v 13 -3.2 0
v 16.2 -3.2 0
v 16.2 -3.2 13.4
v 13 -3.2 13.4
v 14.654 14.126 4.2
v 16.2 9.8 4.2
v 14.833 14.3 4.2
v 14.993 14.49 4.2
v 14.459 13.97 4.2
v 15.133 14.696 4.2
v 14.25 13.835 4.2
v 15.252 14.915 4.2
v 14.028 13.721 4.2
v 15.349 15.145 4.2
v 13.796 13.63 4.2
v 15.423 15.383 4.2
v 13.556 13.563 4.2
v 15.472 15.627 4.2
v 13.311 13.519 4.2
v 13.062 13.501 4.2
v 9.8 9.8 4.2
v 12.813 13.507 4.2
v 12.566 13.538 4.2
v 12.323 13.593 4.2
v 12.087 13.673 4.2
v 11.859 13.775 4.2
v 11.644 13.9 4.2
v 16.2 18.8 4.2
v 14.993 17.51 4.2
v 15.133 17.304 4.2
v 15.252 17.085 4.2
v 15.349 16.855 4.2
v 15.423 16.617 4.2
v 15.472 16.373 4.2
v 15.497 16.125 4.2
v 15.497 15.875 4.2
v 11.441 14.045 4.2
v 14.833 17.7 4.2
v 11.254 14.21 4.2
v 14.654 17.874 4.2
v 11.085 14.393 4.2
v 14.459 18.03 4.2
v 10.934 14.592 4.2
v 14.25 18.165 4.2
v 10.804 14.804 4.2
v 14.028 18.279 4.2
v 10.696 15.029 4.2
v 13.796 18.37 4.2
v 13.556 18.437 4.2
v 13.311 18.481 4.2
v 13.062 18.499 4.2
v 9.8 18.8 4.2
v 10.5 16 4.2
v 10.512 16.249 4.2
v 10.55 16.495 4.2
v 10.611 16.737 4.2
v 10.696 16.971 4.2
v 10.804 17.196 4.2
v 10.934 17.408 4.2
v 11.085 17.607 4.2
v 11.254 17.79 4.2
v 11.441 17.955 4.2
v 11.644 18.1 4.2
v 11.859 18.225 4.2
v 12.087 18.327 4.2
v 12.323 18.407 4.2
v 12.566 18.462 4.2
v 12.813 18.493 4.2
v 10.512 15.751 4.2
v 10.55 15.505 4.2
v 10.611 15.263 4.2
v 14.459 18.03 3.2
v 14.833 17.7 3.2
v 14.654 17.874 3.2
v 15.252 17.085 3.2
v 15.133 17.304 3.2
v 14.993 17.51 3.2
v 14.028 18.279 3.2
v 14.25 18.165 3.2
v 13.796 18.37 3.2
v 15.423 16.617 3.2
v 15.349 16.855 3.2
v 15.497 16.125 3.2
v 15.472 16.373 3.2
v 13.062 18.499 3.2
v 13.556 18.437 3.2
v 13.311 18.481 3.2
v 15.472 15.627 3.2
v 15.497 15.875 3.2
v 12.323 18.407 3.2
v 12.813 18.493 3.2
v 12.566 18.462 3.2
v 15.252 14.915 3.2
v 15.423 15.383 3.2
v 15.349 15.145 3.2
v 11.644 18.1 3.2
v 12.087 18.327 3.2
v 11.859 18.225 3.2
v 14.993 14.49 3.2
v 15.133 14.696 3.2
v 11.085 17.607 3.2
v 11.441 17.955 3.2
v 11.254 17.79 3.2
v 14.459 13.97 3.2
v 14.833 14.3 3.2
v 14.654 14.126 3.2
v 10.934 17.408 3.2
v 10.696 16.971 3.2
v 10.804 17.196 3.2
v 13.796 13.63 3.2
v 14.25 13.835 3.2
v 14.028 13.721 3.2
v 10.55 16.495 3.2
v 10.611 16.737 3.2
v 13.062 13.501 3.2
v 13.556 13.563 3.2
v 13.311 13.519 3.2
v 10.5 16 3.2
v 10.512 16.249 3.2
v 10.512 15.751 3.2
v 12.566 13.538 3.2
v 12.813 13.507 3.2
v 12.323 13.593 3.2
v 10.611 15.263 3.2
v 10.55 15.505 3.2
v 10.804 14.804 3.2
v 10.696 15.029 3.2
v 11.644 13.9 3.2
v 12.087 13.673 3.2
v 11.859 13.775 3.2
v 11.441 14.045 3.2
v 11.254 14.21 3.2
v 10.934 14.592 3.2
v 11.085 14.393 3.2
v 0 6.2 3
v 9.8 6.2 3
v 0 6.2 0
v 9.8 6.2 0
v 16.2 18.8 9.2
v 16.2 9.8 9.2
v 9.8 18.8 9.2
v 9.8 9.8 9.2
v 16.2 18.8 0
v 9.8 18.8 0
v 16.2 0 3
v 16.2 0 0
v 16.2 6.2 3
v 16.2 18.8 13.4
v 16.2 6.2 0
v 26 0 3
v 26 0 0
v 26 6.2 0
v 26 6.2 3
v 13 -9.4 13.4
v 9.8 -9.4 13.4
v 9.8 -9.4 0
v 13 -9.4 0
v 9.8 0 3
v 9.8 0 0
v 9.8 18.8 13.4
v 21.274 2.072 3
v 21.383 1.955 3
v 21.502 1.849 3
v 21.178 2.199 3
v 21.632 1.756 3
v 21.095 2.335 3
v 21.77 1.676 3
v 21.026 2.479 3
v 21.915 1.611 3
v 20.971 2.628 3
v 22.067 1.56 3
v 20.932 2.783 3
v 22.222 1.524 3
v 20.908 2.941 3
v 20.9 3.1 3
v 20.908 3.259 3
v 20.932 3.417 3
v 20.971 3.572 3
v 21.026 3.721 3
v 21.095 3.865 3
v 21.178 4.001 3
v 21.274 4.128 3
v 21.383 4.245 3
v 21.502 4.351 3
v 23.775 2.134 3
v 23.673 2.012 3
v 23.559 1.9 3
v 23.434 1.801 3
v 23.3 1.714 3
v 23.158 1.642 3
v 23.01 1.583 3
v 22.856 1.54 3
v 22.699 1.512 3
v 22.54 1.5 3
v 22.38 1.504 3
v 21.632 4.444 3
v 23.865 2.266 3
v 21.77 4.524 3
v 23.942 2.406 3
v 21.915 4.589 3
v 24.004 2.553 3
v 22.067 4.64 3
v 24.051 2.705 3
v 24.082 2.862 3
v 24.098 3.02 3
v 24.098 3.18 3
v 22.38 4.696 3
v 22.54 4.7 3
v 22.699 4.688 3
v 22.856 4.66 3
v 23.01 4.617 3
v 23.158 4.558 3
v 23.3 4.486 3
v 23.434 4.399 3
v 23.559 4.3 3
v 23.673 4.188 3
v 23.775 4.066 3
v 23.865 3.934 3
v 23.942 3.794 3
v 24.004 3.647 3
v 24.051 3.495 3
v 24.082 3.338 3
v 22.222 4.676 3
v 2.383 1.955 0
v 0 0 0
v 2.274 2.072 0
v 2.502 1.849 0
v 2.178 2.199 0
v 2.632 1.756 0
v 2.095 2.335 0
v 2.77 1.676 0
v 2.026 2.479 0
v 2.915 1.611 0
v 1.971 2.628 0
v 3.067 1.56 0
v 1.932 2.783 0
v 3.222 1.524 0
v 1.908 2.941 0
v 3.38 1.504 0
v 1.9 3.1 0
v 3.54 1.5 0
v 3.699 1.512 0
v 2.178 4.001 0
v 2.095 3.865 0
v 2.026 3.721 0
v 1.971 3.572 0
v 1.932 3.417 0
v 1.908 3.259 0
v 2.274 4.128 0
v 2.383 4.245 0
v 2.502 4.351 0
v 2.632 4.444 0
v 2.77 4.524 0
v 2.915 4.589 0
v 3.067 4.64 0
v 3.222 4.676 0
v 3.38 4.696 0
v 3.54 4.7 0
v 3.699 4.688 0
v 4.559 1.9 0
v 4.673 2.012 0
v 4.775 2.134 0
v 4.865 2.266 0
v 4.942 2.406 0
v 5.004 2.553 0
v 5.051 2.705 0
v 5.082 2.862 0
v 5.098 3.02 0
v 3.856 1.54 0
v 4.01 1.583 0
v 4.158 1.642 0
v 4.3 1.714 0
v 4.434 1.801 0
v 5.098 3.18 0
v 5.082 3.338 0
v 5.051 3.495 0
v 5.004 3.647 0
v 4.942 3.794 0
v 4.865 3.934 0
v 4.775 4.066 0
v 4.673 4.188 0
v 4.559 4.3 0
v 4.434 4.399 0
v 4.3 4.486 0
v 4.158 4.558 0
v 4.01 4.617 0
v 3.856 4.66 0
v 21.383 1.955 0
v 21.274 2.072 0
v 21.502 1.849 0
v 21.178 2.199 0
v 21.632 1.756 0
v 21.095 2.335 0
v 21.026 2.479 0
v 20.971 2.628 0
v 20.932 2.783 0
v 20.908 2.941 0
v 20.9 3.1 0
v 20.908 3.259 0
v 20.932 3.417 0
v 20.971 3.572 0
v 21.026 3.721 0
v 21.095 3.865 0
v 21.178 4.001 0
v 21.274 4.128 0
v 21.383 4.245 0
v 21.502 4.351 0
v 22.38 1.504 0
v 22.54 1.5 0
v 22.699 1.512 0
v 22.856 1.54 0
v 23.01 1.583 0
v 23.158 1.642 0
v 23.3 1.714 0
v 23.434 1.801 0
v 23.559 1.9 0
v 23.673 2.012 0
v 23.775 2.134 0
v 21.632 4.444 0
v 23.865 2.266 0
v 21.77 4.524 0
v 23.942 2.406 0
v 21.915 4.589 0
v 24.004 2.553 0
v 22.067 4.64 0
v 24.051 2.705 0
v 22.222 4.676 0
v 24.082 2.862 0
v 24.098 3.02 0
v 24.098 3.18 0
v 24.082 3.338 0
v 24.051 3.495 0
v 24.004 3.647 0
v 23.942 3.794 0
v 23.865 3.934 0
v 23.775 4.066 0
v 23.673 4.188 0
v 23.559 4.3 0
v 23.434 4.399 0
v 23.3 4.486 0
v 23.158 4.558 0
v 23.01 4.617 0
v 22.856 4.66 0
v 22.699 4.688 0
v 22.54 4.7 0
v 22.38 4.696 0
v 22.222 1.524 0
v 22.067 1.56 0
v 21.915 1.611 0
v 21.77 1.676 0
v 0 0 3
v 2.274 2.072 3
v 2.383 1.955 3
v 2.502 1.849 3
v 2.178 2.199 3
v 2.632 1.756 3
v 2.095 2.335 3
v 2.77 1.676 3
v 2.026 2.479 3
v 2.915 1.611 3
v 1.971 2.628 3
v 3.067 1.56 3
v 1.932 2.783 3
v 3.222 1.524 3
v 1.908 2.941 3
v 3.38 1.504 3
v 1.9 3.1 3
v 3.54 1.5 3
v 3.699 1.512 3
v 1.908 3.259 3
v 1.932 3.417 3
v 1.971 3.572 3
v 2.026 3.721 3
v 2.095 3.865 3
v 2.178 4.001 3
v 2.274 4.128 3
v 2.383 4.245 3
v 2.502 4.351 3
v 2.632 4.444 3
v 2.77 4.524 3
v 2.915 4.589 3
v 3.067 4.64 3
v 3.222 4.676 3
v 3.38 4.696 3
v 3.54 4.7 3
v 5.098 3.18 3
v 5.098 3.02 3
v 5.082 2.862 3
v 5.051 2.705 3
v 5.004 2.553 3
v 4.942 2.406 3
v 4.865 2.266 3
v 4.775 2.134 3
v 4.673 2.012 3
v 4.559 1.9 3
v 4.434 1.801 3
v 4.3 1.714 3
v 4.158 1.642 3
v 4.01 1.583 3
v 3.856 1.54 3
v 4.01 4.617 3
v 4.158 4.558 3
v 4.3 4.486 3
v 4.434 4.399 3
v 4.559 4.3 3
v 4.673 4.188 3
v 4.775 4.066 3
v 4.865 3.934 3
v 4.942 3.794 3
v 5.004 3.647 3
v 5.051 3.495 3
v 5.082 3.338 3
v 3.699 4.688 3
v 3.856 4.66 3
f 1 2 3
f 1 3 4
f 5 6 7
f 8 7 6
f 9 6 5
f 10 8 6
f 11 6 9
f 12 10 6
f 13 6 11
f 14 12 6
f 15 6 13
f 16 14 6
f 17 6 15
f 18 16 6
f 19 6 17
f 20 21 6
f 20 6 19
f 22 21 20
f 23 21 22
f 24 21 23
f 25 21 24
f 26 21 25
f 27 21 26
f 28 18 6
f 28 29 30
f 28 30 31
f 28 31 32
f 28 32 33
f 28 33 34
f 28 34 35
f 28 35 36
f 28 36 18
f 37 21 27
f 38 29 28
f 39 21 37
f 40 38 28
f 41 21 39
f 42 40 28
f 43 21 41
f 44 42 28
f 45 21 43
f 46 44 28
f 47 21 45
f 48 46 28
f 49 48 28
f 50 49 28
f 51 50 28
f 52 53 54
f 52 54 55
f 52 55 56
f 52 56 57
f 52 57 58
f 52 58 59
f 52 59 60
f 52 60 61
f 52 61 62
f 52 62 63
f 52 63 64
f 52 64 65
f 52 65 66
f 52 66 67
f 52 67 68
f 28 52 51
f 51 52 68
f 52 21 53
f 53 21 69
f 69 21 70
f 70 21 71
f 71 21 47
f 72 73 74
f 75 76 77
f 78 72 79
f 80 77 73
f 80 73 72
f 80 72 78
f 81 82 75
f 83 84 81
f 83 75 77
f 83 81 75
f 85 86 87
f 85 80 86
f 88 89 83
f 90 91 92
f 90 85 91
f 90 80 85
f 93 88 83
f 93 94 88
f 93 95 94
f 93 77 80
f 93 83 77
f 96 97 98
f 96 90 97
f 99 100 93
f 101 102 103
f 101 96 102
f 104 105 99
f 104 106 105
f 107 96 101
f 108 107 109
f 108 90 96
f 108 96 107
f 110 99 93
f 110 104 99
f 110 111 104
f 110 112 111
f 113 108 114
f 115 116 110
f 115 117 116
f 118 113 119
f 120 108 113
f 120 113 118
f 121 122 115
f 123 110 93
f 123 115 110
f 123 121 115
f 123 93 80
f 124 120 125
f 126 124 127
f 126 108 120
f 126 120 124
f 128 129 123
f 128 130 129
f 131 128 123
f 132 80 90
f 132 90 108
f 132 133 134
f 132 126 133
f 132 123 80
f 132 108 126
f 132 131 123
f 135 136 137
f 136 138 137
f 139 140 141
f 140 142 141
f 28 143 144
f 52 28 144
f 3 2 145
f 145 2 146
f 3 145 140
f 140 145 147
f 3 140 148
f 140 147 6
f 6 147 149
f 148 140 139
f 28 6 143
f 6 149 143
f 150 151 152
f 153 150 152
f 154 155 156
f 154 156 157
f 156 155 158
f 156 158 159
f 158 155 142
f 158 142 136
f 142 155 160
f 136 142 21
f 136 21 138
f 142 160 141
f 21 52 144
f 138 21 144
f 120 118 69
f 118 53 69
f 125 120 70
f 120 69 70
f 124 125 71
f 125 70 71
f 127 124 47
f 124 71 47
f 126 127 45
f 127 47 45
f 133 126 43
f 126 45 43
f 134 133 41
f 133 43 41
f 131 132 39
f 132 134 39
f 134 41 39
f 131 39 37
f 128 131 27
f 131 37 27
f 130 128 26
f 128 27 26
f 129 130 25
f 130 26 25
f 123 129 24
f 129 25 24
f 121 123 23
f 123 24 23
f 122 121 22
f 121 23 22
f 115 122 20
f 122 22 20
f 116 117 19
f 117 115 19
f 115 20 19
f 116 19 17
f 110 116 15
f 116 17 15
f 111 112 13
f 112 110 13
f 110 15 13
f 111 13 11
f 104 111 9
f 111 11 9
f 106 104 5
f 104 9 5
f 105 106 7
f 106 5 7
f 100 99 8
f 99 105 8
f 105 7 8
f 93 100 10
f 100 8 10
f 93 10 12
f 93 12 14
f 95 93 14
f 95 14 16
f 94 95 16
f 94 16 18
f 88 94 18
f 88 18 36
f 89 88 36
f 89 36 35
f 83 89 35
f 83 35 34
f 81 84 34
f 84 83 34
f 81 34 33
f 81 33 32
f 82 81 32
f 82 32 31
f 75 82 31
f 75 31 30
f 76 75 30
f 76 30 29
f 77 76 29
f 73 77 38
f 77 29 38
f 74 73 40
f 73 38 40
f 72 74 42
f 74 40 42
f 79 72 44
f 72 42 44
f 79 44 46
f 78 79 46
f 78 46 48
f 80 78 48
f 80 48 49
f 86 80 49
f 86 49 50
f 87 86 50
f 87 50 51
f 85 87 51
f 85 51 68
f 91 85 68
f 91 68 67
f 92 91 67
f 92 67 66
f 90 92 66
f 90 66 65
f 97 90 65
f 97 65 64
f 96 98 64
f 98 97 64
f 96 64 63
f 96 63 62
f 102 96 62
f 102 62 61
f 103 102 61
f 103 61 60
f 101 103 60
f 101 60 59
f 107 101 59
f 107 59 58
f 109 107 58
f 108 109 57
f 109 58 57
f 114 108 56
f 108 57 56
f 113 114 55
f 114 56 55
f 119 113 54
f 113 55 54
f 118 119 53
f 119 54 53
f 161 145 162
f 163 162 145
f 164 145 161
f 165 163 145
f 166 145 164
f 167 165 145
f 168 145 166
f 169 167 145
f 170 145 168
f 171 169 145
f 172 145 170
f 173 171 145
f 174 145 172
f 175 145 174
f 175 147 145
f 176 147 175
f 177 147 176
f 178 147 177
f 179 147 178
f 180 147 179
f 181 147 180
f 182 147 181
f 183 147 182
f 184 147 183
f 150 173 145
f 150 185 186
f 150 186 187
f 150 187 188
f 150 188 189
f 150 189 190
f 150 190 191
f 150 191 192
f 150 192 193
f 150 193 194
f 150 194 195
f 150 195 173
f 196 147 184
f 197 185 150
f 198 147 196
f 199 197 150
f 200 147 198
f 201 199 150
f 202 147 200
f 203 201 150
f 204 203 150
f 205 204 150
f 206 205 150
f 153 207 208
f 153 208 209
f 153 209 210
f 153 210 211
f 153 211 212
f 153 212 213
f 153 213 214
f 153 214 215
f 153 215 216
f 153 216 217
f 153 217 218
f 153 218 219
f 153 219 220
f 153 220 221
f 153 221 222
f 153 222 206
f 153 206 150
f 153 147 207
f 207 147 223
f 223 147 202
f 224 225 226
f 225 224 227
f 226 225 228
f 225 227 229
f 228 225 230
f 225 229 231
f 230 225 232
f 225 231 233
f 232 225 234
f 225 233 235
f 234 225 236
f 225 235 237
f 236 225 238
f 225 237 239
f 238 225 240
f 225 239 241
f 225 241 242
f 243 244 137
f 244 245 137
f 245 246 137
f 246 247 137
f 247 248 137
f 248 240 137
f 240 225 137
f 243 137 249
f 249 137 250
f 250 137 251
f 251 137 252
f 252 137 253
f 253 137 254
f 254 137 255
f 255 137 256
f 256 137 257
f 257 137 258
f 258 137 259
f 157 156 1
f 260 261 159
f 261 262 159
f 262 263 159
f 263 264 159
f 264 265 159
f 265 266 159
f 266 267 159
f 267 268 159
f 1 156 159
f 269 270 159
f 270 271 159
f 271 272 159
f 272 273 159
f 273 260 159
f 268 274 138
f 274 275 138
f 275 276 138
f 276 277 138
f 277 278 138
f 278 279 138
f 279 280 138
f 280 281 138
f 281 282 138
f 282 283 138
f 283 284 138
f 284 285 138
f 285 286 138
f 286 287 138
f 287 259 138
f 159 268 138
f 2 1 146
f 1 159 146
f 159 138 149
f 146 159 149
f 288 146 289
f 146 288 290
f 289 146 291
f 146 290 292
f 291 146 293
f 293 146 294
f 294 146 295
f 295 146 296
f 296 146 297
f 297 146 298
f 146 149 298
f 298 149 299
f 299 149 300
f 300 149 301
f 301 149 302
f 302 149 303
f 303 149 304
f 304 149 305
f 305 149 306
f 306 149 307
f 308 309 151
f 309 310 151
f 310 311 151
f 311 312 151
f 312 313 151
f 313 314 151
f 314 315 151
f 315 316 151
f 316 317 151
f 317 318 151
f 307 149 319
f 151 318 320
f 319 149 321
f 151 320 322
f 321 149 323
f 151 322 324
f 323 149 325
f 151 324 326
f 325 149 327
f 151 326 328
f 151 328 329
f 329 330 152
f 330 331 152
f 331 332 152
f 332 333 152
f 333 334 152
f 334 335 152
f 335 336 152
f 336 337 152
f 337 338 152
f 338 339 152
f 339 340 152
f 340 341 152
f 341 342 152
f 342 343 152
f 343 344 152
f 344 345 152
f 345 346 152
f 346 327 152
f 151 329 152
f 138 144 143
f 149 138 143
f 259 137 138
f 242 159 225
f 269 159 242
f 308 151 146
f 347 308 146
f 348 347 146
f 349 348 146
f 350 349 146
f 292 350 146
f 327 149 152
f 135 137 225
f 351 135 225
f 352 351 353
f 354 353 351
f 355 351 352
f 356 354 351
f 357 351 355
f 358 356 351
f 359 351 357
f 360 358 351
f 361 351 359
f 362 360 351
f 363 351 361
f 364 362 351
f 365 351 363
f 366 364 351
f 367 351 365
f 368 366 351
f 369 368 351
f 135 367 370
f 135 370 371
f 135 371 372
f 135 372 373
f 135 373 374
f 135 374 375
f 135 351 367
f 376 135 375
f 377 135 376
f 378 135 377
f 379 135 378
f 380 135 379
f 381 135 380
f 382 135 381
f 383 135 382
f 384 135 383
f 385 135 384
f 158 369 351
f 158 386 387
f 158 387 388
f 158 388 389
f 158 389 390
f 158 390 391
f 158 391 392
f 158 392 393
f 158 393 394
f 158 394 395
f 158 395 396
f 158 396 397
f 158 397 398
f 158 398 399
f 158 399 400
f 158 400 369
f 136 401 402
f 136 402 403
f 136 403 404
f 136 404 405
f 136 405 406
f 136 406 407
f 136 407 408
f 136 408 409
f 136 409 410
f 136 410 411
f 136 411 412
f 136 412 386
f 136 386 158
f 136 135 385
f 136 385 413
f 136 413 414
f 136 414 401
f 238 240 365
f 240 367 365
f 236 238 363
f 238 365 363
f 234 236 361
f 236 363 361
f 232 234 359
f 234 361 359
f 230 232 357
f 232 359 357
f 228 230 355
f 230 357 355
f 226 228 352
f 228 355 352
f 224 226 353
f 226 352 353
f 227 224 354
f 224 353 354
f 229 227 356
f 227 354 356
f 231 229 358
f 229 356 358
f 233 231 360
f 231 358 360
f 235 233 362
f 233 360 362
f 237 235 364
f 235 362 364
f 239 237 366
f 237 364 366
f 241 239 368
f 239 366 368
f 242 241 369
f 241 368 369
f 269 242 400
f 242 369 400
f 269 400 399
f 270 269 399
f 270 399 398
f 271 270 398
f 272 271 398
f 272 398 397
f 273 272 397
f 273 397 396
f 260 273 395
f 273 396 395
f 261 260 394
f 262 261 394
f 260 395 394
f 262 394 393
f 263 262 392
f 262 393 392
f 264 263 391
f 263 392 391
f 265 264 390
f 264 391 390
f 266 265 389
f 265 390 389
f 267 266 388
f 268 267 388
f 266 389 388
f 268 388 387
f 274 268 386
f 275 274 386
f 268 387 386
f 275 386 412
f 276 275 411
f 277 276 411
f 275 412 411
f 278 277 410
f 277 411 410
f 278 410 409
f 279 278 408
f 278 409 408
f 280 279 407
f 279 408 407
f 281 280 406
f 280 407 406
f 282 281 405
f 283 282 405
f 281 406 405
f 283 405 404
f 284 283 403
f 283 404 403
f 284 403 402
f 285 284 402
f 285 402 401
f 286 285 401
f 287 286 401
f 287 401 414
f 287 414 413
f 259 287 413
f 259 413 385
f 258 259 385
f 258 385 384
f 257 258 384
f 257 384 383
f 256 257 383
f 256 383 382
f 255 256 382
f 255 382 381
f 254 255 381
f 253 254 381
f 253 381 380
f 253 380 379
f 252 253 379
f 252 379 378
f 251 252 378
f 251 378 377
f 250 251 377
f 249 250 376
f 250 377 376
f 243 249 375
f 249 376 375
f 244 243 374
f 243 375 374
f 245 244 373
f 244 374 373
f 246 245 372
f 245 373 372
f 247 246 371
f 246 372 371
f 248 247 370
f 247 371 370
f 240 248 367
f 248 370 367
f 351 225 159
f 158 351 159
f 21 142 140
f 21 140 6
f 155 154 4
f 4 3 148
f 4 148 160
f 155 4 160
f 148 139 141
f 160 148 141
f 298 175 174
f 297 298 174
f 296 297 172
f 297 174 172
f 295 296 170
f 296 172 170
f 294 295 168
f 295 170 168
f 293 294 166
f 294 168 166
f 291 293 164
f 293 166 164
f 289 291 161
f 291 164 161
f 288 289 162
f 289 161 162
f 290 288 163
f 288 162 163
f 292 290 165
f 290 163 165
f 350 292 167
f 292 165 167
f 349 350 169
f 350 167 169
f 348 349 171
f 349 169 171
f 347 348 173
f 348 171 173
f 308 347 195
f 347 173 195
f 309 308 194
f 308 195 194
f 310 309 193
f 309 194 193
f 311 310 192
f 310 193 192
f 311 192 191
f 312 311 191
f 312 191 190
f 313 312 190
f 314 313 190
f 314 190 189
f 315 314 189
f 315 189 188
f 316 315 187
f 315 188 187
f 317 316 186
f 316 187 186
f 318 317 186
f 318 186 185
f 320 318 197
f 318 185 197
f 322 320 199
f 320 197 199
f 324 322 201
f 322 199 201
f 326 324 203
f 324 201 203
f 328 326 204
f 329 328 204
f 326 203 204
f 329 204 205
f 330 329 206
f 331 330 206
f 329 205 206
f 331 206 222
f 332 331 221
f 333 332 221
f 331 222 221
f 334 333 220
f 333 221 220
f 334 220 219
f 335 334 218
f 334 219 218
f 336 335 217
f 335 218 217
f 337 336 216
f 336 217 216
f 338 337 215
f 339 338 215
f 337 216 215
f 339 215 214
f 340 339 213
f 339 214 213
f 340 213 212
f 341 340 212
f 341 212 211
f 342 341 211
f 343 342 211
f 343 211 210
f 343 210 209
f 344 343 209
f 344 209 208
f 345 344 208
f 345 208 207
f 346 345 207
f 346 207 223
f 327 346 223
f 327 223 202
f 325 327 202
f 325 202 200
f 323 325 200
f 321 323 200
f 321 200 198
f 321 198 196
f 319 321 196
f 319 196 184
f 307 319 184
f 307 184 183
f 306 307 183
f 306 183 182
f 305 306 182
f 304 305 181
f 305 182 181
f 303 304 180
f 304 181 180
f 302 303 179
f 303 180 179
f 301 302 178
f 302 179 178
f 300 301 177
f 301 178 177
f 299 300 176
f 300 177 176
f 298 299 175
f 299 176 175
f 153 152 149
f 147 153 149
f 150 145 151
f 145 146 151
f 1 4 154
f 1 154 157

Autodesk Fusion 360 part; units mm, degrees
sketch "Sketch1" plane through (0, 0, 0) normal (0, 0, 1) x (1, 0, 0)
  line L0 (0, 0) -> (26, 0)
  line L1 (26, 0) -> (26, 6.2)
  line L2 (26, 6.2) -> (0, 6.2)
  line L3 (0, 6.2) -> (0, 0)
  dimension "d1" = 26
  dimension "d2" = 6.2
extrude "Extrude1" add sketch "Sketch1" along normal blind 3
sketch "Sketch2" plane through (0, 0, 0) normal (0, 0, 1) x (1, 0, 0)
  line L0 (0, 0) -> (13, 0)
  line L1 (13, 0) -> (13, -3.2)
  line L2 (13, -3.2) -> (9.8, -3.2)
  line L3 (9.8, -3.2) -> (9.8, 0)
  line L4 (9.8, 0) -> (13, 0)
  line L5 (13, 0) -> (13, -3.2)
  line L6 (13, -3.2) -> (16.2, -3.2)
  line L7 (16.2, -3.2) -> (16.2, 0)
  line L8 (16.2, 0) -> (13, 0)
  line L9 (13, 0) -> (13, -3.2)
  line L10 (9.8, -3.2) -> (16.2, -3.2)
  line L11 (16.2, -3.2) -> (16.2, 18.8)
  line L12 (16.2, 18.8) -> (9.8, 18.8)
  line L13 (9.8, 18.8) -> (9.8, -3.2)
  dimension "d5" = 13
  dimension "d6" = 3.2
  dimension "d7" = 3.2
  dimension "d8" = 3.2
  dimension "d9" = 6.4
  dimension "d10" = 22
extrude "Extrude2" add sketch "Sketch2" along normal blind 13.4
sketch "Sketch3" plane through (0, -3.2, 0) normal (0, -1, 0) x (1, 0, 0)
  line L0 (9.8, 0) -> (16.2, 0)
  line L1 (16.2, 0) -> (16.2, 13.4)
  line L2 (16.2, 13.4) -> (9.8, 13.4)
  line L3 (9.8, 13.4) -> (9.8, 0)
  line L4 (9.8, 13.4) -> (13, 13.4)
  line L5 (13, 13.4) -> (13, 0)
  line L6 (13, 0) -> (9.8, 0)
  line L7 (9.8, 0) -> (9.8, 13.4)
extrude "Extrude3" add sketch "Sketch3" along normal blind 6.2 contours L0 L2 L3 L4 L5 L6 L7
sketch "Sketch4" plane through (0, 0, 3) normal (0, 0, 1) x (-1, 0, 0)
  line L0 (-9.8, 0) -> (-9.8, -6.2)
  line L1 (-9.8, -6.2) -> (0, -6.2)
  line L2 (0, -6.2) -> (0, 0)
  line L3 (0, 0) -> (-9.8, 0)
  line L4 (-13, 3) -> (-13, -19)
  line L5 (-13, -19) -> (-13, 3)
  line L6 (0, -3.1) -> (-26, -3.1)
  line L7 (-13, -3.1) -> (-3.5, -3.1)
  line L8 (-13, -3.1) -> (-22.5, -3.1)
  circle A0 centre (-3.5, -3.1) radius 1.6
  circle A1 centre (-22.5, -3.1) radius 1.6
  dimension "d15" = 9.5
  dimension "d16" = 9.5
  dimension "d17" = 3.2
  dimension "d18" = 3.2
extrude "Extrude4" cut sketch "Sketch4" against normal blind 17 contours L6 L8 A1 | L6 L8 A1 | L6 L7 A0 | L6 L7 A0
sketch "Sketch5" plane through (9.8, 0, 0) normal (-1, 0, 0) x (0, -1, 0)
  line L0 (-6.2, 0) -> (-6.2, 3)
  line L1 (-6.2, 3) -> (0, 3)
  line L2 (0, 3) -> (0, 0)
  line L3 (0, 0) -> (9.4, 0)
  line L4 (9.4, 0) -> (9.4, 13.4)
  line L5 (9.4, 13.4) -> (-18.8, 13.4)
  line L6 (-18.8, 13.4) -> (-18.8, 0)
  line L7 (-18.8, 0) -> (-6.2, 0)
  line L8 (-18.8, 6.7) -> (-9.8, 6.7)
  line L9 (-9.8, 6.7) -> (-9.8, 9.2)
  line L10 (-9.8, 9.2) -> (-18.8, 9.2)
  line L11 (-18.8, 9.2) -> (-18.8, 6.7)
  line L12 (-18.8, 6.7) -> (-9.8, 6.7)
  line L13 (-9.8, 6.7) -> (-9.8, 4.2)
  line L14 (-9.8, 4.2) -> (-18.8, 4.2)
  line L15 (-18.8, 4.2) -> (-18.8, 6.7)
  dimension "d21" = 9
  dimension "d22" = 2.5
  dimension "d23" = 2.5
extrude "Extrude5" cut sketch "Sketch5" against normal blind 17 contours L6 L8 L12 L13 L14 L15 | L6 L8 L9 L10 L11 L12
sketch "Sketch6" plane through (0, 0, 4.2) normal (0, 0, 1) x (-1, 0, 0)
  line L0 (-16.2, -9.8) -> (-16.2, -18.8)
  line L1 (-16.2, -18.8) -> (-9.8, -18.8)
  line L2 (-9.8, -18.8) -> (-9.8, -9.8)
  line L3 (-9.8, -9.8) -> (-16.2, -9.8)
  line L4 (-13, -3) -> (-13, -16)
  circle A0 centre (-13, -16) radius 2.5
  dimension "d26" = 13
  dimension "d27" = 5
extrude "Extrude6" cut sketch "Sketch6" against normal blind 1 contours A0
